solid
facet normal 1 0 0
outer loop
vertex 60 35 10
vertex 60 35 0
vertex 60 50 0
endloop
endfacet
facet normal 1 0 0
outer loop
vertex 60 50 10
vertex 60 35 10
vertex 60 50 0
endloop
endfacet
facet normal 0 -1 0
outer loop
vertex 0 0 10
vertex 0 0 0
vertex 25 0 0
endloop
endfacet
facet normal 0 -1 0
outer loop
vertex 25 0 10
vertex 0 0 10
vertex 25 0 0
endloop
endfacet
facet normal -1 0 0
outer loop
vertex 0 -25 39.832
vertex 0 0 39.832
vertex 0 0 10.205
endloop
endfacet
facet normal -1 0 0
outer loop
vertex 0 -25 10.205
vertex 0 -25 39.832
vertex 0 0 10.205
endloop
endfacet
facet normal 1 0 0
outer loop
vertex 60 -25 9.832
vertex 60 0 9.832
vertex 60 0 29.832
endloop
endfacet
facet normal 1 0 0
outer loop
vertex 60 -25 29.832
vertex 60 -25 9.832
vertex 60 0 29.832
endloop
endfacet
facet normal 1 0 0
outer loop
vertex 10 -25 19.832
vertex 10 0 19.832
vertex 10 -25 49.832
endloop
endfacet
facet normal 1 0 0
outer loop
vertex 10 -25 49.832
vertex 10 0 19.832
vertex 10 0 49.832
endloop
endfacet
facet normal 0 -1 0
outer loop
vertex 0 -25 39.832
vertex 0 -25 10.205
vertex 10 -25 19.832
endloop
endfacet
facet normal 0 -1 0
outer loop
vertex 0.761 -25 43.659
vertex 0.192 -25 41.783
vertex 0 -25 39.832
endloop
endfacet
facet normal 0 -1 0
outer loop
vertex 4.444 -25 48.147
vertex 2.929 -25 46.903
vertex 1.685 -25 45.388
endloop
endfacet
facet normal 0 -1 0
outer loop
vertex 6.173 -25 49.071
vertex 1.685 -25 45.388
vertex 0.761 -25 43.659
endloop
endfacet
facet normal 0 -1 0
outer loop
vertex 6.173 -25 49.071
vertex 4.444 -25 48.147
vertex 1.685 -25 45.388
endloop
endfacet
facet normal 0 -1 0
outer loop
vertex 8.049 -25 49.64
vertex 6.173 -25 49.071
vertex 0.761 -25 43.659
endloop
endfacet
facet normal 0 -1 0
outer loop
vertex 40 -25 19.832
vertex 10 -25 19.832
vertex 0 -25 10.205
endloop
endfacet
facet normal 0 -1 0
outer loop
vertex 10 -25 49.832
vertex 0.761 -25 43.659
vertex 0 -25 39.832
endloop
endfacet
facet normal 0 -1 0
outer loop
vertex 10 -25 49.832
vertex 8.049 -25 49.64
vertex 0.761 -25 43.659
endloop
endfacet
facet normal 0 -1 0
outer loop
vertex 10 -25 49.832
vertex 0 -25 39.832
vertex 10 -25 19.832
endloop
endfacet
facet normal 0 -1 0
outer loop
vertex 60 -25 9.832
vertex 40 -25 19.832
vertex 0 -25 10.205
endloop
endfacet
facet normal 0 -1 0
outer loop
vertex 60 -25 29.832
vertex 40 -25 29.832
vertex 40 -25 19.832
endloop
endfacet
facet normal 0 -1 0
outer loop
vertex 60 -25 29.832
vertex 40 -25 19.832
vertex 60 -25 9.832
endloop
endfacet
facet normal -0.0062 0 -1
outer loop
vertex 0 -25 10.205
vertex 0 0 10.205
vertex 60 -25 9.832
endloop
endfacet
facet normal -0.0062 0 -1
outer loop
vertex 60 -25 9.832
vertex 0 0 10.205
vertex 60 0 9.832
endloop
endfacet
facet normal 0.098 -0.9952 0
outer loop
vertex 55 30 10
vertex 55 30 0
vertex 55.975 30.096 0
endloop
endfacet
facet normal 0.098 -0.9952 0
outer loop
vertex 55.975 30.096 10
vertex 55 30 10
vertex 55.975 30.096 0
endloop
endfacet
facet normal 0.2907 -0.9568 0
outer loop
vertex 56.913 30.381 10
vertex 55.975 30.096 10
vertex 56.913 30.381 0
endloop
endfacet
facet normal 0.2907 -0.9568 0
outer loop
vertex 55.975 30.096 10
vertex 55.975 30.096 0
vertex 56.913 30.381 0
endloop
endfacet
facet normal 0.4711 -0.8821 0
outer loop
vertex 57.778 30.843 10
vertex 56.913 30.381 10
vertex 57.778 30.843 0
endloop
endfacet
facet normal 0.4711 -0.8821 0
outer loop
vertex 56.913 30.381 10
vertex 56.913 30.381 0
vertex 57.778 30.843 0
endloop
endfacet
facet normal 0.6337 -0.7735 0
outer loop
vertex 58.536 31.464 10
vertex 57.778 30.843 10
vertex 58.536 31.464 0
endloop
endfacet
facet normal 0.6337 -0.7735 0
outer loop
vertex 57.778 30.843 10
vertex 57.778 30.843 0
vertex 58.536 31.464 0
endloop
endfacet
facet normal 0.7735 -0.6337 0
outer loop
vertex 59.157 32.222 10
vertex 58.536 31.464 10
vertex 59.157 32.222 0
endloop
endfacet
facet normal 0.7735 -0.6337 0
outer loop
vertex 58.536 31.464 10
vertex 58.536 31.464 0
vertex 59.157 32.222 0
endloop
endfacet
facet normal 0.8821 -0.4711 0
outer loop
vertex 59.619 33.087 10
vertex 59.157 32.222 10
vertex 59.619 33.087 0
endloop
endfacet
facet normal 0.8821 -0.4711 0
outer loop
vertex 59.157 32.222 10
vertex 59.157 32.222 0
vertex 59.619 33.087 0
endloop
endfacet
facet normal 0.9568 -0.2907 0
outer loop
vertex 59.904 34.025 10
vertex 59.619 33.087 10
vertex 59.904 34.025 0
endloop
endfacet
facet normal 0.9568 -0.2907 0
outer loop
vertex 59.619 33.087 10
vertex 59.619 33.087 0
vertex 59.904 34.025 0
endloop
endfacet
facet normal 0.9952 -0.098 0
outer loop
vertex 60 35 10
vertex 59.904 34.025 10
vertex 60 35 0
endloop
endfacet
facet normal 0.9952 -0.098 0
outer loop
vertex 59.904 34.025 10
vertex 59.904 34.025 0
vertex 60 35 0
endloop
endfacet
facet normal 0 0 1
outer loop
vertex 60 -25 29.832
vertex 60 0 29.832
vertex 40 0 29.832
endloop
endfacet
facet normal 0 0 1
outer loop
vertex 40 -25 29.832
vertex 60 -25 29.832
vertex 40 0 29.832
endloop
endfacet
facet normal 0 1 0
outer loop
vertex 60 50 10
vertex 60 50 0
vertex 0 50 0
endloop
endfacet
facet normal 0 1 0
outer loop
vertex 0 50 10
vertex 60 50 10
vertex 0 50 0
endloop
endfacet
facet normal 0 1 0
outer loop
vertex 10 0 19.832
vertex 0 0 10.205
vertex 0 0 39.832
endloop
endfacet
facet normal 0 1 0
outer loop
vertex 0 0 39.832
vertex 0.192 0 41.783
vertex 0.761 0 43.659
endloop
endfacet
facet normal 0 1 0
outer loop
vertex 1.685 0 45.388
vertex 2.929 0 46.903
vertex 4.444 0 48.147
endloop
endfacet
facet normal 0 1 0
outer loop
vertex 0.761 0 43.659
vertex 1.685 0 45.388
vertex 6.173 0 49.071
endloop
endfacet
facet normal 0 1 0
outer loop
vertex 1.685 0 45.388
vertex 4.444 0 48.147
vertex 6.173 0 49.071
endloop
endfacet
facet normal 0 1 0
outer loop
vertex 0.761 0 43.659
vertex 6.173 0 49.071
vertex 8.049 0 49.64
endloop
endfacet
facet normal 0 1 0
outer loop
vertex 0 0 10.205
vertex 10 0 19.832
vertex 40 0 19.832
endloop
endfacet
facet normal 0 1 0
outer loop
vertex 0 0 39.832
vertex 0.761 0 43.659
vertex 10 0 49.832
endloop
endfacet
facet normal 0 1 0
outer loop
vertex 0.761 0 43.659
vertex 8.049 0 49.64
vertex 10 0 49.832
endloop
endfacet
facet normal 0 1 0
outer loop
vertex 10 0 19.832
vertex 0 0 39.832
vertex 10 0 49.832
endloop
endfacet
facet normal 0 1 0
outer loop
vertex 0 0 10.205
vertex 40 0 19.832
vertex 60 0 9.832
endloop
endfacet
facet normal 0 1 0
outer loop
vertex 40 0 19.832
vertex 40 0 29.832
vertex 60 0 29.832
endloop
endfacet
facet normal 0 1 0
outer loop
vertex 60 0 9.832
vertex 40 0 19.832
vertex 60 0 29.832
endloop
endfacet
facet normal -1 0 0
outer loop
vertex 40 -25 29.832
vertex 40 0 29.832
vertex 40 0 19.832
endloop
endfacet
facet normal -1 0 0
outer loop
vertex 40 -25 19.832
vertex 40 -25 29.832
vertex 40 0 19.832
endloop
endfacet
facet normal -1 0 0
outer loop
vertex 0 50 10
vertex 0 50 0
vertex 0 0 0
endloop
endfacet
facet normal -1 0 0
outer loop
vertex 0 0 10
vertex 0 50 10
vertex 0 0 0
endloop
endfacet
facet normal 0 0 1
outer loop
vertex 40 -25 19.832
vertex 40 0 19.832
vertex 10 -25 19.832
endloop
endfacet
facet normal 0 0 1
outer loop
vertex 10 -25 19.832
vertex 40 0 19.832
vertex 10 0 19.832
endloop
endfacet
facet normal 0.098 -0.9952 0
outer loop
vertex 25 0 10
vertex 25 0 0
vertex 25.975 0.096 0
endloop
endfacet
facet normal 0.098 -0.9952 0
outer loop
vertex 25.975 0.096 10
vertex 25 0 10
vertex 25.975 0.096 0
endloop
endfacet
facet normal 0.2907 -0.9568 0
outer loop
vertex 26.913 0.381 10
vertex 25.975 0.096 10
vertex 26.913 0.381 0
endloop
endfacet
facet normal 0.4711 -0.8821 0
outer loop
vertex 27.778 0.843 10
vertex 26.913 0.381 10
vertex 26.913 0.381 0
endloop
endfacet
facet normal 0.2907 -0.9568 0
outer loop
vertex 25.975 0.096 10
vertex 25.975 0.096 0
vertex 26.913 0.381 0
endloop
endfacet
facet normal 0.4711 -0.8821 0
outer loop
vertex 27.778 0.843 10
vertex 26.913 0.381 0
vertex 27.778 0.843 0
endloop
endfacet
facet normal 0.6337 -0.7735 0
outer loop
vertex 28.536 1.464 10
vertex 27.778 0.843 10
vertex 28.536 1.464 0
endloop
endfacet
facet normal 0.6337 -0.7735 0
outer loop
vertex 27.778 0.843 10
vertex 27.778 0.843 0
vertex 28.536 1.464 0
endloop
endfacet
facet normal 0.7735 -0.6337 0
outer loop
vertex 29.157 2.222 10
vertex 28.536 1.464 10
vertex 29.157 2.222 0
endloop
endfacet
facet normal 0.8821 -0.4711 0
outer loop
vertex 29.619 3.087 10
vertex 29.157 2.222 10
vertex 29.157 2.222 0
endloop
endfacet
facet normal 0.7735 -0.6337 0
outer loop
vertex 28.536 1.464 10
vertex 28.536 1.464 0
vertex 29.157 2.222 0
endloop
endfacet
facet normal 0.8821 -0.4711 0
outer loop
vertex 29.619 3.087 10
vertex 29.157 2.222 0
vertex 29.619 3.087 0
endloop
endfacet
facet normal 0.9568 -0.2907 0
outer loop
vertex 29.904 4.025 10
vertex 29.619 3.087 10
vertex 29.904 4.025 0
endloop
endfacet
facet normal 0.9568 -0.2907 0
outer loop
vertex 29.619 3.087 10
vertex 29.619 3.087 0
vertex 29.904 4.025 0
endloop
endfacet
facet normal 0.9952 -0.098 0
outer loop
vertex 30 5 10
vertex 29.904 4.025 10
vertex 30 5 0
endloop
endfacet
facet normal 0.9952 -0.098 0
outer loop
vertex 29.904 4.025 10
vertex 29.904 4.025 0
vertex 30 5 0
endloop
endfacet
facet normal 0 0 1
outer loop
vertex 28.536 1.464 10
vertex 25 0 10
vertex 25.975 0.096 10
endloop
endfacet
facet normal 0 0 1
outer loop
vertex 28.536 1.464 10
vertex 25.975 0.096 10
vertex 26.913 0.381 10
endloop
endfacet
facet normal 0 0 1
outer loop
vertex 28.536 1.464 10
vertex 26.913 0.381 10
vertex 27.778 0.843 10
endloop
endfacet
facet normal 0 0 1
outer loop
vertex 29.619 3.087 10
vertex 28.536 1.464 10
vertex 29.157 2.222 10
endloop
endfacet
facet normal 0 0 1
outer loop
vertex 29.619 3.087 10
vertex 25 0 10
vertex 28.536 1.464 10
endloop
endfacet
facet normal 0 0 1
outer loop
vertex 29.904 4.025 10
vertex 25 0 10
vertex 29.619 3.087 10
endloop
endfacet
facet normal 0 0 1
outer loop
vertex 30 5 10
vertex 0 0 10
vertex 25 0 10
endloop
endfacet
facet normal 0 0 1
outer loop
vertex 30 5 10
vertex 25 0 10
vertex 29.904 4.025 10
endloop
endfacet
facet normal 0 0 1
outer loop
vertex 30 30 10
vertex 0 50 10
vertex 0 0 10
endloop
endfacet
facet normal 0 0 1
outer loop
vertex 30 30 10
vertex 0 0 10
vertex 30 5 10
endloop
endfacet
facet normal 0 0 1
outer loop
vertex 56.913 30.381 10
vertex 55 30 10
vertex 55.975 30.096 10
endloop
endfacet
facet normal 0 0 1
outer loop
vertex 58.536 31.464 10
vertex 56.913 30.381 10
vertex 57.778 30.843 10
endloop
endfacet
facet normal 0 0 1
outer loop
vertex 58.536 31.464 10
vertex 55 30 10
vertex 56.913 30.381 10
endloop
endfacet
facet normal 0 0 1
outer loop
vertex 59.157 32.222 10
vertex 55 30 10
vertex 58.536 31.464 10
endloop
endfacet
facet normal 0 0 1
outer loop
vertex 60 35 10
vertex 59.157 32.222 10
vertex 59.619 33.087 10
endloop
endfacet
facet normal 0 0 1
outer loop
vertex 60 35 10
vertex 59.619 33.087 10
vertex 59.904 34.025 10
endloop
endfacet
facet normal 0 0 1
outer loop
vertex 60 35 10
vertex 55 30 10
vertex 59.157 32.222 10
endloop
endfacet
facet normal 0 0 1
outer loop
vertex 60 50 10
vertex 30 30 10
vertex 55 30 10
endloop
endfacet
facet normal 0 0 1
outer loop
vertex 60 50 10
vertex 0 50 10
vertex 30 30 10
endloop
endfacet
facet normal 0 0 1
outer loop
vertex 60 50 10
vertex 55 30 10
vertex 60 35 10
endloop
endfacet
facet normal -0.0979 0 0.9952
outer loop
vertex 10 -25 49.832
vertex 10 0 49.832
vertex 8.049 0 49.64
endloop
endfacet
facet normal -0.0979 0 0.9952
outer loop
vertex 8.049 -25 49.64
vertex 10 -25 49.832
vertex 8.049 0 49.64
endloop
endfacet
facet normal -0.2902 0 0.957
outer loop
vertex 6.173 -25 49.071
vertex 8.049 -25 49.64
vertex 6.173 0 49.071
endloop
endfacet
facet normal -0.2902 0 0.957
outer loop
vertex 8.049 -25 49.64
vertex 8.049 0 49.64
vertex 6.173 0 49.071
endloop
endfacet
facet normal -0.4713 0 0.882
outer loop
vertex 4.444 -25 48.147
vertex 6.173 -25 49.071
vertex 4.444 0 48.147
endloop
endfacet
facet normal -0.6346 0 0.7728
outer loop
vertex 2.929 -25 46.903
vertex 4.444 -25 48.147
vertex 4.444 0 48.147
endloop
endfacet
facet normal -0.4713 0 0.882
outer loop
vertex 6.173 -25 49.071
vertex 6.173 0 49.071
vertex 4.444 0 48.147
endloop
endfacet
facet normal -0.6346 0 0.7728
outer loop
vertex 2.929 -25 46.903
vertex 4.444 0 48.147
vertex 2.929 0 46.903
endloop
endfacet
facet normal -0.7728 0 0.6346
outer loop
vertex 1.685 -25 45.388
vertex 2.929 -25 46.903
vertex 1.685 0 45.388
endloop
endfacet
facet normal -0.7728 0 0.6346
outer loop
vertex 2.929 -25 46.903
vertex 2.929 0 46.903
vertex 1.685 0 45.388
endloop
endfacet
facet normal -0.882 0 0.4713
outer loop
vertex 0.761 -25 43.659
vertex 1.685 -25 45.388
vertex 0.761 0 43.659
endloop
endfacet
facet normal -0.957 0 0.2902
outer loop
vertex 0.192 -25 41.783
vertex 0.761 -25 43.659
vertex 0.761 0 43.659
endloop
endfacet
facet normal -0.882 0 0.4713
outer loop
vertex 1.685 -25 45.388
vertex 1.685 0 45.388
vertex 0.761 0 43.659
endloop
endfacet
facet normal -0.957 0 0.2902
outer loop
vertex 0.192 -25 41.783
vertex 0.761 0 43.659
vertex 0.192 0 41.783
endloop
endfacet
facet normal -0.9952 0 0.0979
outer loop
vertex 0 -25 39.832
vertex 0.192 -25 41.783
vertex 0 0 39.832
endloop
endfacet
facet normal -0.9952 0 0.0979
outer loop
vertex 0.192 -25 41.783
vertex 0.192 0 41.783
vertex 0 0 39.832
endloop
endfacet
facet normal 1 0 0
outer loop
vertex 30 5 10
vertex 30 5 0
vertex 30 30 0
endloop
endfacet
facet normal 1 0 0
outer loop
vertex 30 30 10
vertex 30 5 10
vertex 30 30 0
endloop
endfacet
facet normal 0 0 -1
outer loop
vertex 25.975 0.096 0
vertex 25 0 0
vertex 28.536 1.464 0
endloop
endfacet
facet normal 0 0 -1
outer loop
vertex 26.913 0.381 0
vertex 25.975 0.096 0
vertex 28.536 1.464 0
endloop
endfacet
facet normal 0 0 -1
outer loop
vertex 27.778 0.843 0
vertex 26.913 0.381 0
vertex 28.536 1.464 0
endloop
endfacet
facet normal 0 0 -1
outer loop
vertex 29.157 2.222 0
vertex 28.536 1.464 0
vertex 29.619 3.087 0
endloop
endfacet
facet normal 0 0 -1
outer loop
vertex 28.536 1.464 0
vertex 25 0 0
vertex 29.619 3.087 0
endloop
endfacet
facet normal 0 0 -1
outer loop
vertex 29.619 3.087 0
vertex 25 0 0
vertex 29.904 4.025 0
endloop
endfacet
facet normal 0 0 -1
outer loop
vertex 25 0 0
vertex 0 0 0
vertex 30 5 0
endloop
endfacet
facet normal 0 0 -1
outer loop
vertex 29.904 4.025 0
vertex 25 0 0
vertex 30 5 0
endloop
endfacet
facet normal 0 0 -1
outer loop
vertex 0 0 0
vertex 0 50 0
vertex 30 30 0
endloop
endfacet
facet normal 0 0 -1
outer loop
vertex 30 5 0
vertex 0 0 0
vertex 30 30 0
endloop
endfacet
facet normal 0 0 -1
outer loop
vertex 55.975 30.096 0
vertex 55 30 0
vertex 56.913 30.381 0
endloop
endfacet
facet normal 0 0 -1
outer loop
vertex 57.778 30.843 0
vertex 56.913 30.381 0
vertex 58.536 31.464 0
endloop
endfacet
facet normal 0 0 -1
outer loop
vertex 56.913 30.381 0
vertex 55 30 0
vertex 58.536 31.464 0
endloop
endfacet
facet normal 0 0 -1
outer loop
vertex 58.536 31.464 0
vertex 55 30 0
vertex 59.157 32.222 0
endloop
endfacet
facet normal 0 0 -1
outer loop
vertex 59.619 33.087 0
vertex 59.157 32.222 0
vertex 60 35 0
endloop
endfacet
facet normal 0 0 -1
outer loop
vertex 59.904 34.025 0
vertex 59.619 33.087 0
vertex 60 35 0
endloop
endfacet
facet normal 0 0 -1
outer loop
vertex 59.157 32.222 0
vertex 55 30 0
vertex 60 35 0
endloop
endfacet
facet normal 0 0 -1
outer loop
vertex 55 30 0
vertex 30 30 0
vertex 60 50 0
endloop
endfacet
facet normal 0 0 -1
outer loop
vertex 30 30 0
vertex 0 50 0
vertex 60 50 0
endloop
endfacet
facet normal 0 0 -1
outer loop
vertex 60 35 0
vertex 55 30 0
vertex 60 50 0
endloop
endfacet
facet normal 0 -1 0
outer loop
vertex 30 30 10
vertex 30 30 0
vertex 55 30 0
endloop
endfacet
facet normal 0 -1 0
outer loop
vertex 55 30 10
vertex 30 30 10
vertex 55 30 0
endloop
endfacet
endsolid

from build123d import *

# Parameters (mm, degrees)
F1_DEPTH = 10
F3_DEPTH = 25
F4_DEPTH = 25


with BuildPart() as f1:
    # F0 (on Top) → F1 (new body)
    with BuildSketch(Plane.XY):
        with BuildLine():
            Line((0, 50), (0, 0))
            Line((0, 0), (25, 0))
            ThreePointArc((25, 0), (28.535534, 1.464466), (30, 5))
            Line((30, 5), (30, 30))
            Line((30, 30), (55, 30))
            ThreePointArc((55, 30), (58.535534, 31.464466), (60, 35))
            Line((60, 35), (60, 50))
            Line((60, 50), (0, 50))
        make_face()
    extrude(amount=F1_DEPTH)


with BuildPart() as f3:
    # F2 (on Front) → F3 (new body)
    with BuildSketch(Plane.XZ):
        with BuildLine():
            Line((0, 10.204769), (60, 9.831907))
            Line((60, 9.831907), (60, 29.831907))
            Line((60, 29.831907), (40, 29.831907))
            Line((40, 29.831907), (40, 19.831907))
            Line((40, 19.831907), (10, 19.831907))
            Line((10, 19.831907), (10, 49.831907))
            ThreePointArc((10, 49.831907), (2.928932, 46.902975), (0, 39.831907))
            Line((0, 39.831907), (0, 10.204769))
        make_face()
    extrude(amount=F3_DEPTH)

    # F2 (on Front) → F4 (join)
    with BuildSketch(Plane.XZ):
        with BuildLine():
            Line((0, 10.204769), (60, 9.831907))
            Line((60, 9.831907), (60, 29.831907))
            Line((60, 29.831907), (40, 29.831907))
            Line((40, 29.831907), (40, 19.831907))
            Line((40, 19.831907), (10, 19.831907))
            Line((10, 19.831907), (10, 49.831907))
            ThreePointArc((10, 49.831907), (2.928932, 46.902975), (0, 39.831907))
            Line((0, 39.831907), (0, 10.204769))
        make_face()
    extrude(amount=F4_DEPTH)


solid = Compound([f1.part, f3.part])
